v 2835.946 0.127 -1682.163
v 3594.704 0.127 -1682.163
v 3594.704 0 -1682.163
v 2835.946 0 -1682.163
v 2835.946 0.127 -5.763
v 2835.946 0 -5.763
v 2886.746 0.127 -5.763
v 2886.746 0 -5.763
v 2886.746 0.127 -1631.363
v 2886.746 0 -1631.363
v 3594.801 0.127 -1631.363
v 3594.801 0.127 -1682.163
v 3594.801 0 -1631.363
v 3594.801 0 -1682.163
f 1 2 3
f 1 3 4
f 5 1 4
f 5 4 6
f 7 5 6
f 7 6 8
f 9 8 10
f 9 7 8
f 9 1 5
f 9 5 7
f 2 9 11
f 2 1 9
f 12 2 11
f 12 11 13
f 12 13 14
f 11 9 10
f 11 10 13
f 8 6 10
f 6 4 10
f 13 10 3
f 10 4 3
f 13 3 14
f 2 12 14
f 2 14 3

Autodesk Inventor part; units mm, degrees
ref_plane "YZ Plane" through (0, 0, 0) normal (1, 0, 0) x (0, 1, 0)
ref_plane "XZ Plane" through (0, 0, 0) normal (0, 1, 0) x (-1, 0, 0)
ref_plane "XY Plane" through (0, 0, 0) normal (0, 0, 1) x (1, 0, 0)
sketch "Sketch1" plane through (2835.9464, 0.127, -1682.1632) normal (0, 1, 0) x (1, 0, 0)
  line L0 (0, -1676.4) -> (50.8001, -1676.4) projected
  line L1 (50.8001, -1676.4) -> (50.8001, -50.8) projected
  line L2 (50.8001, -50.8) -> (758.8544, -50.8) projected
  line L3 (758.8544, -50.8) -> (758.7571, 0) construction
  line L4 (758.7571, 0) -> (0, 0) projected
  line L5 (0, 0) -> (0, -1676.4) projected
  line L6 (758.8544, -50.8) -> (758.8544, 0)
  line L7 (758.8544, -50.8) -> (809.6544, -50.8) construction
  line L8 (758.8544, 0) -> (0, 0)
  line L9 (0, 0) -> (0, -1676.4)
  line L10 (0, -1676.4) -> (50.8001, -1676.4)
  line L11 (50.8001, -1676.4) -> (50.8001, -50.8)
  line L12 (50.8001, -50.8) -> (758.8544, -50.8)
  point P0 (-2835.9464, -1682.1632)
  dimension "d0" = 90
  dimension "d1" = 90
  dimension "d2" = 90
extrude "Extrusion1" add sketch "Sketch1" against normal blind 0.127
properties part number "protected zone tape Red"
